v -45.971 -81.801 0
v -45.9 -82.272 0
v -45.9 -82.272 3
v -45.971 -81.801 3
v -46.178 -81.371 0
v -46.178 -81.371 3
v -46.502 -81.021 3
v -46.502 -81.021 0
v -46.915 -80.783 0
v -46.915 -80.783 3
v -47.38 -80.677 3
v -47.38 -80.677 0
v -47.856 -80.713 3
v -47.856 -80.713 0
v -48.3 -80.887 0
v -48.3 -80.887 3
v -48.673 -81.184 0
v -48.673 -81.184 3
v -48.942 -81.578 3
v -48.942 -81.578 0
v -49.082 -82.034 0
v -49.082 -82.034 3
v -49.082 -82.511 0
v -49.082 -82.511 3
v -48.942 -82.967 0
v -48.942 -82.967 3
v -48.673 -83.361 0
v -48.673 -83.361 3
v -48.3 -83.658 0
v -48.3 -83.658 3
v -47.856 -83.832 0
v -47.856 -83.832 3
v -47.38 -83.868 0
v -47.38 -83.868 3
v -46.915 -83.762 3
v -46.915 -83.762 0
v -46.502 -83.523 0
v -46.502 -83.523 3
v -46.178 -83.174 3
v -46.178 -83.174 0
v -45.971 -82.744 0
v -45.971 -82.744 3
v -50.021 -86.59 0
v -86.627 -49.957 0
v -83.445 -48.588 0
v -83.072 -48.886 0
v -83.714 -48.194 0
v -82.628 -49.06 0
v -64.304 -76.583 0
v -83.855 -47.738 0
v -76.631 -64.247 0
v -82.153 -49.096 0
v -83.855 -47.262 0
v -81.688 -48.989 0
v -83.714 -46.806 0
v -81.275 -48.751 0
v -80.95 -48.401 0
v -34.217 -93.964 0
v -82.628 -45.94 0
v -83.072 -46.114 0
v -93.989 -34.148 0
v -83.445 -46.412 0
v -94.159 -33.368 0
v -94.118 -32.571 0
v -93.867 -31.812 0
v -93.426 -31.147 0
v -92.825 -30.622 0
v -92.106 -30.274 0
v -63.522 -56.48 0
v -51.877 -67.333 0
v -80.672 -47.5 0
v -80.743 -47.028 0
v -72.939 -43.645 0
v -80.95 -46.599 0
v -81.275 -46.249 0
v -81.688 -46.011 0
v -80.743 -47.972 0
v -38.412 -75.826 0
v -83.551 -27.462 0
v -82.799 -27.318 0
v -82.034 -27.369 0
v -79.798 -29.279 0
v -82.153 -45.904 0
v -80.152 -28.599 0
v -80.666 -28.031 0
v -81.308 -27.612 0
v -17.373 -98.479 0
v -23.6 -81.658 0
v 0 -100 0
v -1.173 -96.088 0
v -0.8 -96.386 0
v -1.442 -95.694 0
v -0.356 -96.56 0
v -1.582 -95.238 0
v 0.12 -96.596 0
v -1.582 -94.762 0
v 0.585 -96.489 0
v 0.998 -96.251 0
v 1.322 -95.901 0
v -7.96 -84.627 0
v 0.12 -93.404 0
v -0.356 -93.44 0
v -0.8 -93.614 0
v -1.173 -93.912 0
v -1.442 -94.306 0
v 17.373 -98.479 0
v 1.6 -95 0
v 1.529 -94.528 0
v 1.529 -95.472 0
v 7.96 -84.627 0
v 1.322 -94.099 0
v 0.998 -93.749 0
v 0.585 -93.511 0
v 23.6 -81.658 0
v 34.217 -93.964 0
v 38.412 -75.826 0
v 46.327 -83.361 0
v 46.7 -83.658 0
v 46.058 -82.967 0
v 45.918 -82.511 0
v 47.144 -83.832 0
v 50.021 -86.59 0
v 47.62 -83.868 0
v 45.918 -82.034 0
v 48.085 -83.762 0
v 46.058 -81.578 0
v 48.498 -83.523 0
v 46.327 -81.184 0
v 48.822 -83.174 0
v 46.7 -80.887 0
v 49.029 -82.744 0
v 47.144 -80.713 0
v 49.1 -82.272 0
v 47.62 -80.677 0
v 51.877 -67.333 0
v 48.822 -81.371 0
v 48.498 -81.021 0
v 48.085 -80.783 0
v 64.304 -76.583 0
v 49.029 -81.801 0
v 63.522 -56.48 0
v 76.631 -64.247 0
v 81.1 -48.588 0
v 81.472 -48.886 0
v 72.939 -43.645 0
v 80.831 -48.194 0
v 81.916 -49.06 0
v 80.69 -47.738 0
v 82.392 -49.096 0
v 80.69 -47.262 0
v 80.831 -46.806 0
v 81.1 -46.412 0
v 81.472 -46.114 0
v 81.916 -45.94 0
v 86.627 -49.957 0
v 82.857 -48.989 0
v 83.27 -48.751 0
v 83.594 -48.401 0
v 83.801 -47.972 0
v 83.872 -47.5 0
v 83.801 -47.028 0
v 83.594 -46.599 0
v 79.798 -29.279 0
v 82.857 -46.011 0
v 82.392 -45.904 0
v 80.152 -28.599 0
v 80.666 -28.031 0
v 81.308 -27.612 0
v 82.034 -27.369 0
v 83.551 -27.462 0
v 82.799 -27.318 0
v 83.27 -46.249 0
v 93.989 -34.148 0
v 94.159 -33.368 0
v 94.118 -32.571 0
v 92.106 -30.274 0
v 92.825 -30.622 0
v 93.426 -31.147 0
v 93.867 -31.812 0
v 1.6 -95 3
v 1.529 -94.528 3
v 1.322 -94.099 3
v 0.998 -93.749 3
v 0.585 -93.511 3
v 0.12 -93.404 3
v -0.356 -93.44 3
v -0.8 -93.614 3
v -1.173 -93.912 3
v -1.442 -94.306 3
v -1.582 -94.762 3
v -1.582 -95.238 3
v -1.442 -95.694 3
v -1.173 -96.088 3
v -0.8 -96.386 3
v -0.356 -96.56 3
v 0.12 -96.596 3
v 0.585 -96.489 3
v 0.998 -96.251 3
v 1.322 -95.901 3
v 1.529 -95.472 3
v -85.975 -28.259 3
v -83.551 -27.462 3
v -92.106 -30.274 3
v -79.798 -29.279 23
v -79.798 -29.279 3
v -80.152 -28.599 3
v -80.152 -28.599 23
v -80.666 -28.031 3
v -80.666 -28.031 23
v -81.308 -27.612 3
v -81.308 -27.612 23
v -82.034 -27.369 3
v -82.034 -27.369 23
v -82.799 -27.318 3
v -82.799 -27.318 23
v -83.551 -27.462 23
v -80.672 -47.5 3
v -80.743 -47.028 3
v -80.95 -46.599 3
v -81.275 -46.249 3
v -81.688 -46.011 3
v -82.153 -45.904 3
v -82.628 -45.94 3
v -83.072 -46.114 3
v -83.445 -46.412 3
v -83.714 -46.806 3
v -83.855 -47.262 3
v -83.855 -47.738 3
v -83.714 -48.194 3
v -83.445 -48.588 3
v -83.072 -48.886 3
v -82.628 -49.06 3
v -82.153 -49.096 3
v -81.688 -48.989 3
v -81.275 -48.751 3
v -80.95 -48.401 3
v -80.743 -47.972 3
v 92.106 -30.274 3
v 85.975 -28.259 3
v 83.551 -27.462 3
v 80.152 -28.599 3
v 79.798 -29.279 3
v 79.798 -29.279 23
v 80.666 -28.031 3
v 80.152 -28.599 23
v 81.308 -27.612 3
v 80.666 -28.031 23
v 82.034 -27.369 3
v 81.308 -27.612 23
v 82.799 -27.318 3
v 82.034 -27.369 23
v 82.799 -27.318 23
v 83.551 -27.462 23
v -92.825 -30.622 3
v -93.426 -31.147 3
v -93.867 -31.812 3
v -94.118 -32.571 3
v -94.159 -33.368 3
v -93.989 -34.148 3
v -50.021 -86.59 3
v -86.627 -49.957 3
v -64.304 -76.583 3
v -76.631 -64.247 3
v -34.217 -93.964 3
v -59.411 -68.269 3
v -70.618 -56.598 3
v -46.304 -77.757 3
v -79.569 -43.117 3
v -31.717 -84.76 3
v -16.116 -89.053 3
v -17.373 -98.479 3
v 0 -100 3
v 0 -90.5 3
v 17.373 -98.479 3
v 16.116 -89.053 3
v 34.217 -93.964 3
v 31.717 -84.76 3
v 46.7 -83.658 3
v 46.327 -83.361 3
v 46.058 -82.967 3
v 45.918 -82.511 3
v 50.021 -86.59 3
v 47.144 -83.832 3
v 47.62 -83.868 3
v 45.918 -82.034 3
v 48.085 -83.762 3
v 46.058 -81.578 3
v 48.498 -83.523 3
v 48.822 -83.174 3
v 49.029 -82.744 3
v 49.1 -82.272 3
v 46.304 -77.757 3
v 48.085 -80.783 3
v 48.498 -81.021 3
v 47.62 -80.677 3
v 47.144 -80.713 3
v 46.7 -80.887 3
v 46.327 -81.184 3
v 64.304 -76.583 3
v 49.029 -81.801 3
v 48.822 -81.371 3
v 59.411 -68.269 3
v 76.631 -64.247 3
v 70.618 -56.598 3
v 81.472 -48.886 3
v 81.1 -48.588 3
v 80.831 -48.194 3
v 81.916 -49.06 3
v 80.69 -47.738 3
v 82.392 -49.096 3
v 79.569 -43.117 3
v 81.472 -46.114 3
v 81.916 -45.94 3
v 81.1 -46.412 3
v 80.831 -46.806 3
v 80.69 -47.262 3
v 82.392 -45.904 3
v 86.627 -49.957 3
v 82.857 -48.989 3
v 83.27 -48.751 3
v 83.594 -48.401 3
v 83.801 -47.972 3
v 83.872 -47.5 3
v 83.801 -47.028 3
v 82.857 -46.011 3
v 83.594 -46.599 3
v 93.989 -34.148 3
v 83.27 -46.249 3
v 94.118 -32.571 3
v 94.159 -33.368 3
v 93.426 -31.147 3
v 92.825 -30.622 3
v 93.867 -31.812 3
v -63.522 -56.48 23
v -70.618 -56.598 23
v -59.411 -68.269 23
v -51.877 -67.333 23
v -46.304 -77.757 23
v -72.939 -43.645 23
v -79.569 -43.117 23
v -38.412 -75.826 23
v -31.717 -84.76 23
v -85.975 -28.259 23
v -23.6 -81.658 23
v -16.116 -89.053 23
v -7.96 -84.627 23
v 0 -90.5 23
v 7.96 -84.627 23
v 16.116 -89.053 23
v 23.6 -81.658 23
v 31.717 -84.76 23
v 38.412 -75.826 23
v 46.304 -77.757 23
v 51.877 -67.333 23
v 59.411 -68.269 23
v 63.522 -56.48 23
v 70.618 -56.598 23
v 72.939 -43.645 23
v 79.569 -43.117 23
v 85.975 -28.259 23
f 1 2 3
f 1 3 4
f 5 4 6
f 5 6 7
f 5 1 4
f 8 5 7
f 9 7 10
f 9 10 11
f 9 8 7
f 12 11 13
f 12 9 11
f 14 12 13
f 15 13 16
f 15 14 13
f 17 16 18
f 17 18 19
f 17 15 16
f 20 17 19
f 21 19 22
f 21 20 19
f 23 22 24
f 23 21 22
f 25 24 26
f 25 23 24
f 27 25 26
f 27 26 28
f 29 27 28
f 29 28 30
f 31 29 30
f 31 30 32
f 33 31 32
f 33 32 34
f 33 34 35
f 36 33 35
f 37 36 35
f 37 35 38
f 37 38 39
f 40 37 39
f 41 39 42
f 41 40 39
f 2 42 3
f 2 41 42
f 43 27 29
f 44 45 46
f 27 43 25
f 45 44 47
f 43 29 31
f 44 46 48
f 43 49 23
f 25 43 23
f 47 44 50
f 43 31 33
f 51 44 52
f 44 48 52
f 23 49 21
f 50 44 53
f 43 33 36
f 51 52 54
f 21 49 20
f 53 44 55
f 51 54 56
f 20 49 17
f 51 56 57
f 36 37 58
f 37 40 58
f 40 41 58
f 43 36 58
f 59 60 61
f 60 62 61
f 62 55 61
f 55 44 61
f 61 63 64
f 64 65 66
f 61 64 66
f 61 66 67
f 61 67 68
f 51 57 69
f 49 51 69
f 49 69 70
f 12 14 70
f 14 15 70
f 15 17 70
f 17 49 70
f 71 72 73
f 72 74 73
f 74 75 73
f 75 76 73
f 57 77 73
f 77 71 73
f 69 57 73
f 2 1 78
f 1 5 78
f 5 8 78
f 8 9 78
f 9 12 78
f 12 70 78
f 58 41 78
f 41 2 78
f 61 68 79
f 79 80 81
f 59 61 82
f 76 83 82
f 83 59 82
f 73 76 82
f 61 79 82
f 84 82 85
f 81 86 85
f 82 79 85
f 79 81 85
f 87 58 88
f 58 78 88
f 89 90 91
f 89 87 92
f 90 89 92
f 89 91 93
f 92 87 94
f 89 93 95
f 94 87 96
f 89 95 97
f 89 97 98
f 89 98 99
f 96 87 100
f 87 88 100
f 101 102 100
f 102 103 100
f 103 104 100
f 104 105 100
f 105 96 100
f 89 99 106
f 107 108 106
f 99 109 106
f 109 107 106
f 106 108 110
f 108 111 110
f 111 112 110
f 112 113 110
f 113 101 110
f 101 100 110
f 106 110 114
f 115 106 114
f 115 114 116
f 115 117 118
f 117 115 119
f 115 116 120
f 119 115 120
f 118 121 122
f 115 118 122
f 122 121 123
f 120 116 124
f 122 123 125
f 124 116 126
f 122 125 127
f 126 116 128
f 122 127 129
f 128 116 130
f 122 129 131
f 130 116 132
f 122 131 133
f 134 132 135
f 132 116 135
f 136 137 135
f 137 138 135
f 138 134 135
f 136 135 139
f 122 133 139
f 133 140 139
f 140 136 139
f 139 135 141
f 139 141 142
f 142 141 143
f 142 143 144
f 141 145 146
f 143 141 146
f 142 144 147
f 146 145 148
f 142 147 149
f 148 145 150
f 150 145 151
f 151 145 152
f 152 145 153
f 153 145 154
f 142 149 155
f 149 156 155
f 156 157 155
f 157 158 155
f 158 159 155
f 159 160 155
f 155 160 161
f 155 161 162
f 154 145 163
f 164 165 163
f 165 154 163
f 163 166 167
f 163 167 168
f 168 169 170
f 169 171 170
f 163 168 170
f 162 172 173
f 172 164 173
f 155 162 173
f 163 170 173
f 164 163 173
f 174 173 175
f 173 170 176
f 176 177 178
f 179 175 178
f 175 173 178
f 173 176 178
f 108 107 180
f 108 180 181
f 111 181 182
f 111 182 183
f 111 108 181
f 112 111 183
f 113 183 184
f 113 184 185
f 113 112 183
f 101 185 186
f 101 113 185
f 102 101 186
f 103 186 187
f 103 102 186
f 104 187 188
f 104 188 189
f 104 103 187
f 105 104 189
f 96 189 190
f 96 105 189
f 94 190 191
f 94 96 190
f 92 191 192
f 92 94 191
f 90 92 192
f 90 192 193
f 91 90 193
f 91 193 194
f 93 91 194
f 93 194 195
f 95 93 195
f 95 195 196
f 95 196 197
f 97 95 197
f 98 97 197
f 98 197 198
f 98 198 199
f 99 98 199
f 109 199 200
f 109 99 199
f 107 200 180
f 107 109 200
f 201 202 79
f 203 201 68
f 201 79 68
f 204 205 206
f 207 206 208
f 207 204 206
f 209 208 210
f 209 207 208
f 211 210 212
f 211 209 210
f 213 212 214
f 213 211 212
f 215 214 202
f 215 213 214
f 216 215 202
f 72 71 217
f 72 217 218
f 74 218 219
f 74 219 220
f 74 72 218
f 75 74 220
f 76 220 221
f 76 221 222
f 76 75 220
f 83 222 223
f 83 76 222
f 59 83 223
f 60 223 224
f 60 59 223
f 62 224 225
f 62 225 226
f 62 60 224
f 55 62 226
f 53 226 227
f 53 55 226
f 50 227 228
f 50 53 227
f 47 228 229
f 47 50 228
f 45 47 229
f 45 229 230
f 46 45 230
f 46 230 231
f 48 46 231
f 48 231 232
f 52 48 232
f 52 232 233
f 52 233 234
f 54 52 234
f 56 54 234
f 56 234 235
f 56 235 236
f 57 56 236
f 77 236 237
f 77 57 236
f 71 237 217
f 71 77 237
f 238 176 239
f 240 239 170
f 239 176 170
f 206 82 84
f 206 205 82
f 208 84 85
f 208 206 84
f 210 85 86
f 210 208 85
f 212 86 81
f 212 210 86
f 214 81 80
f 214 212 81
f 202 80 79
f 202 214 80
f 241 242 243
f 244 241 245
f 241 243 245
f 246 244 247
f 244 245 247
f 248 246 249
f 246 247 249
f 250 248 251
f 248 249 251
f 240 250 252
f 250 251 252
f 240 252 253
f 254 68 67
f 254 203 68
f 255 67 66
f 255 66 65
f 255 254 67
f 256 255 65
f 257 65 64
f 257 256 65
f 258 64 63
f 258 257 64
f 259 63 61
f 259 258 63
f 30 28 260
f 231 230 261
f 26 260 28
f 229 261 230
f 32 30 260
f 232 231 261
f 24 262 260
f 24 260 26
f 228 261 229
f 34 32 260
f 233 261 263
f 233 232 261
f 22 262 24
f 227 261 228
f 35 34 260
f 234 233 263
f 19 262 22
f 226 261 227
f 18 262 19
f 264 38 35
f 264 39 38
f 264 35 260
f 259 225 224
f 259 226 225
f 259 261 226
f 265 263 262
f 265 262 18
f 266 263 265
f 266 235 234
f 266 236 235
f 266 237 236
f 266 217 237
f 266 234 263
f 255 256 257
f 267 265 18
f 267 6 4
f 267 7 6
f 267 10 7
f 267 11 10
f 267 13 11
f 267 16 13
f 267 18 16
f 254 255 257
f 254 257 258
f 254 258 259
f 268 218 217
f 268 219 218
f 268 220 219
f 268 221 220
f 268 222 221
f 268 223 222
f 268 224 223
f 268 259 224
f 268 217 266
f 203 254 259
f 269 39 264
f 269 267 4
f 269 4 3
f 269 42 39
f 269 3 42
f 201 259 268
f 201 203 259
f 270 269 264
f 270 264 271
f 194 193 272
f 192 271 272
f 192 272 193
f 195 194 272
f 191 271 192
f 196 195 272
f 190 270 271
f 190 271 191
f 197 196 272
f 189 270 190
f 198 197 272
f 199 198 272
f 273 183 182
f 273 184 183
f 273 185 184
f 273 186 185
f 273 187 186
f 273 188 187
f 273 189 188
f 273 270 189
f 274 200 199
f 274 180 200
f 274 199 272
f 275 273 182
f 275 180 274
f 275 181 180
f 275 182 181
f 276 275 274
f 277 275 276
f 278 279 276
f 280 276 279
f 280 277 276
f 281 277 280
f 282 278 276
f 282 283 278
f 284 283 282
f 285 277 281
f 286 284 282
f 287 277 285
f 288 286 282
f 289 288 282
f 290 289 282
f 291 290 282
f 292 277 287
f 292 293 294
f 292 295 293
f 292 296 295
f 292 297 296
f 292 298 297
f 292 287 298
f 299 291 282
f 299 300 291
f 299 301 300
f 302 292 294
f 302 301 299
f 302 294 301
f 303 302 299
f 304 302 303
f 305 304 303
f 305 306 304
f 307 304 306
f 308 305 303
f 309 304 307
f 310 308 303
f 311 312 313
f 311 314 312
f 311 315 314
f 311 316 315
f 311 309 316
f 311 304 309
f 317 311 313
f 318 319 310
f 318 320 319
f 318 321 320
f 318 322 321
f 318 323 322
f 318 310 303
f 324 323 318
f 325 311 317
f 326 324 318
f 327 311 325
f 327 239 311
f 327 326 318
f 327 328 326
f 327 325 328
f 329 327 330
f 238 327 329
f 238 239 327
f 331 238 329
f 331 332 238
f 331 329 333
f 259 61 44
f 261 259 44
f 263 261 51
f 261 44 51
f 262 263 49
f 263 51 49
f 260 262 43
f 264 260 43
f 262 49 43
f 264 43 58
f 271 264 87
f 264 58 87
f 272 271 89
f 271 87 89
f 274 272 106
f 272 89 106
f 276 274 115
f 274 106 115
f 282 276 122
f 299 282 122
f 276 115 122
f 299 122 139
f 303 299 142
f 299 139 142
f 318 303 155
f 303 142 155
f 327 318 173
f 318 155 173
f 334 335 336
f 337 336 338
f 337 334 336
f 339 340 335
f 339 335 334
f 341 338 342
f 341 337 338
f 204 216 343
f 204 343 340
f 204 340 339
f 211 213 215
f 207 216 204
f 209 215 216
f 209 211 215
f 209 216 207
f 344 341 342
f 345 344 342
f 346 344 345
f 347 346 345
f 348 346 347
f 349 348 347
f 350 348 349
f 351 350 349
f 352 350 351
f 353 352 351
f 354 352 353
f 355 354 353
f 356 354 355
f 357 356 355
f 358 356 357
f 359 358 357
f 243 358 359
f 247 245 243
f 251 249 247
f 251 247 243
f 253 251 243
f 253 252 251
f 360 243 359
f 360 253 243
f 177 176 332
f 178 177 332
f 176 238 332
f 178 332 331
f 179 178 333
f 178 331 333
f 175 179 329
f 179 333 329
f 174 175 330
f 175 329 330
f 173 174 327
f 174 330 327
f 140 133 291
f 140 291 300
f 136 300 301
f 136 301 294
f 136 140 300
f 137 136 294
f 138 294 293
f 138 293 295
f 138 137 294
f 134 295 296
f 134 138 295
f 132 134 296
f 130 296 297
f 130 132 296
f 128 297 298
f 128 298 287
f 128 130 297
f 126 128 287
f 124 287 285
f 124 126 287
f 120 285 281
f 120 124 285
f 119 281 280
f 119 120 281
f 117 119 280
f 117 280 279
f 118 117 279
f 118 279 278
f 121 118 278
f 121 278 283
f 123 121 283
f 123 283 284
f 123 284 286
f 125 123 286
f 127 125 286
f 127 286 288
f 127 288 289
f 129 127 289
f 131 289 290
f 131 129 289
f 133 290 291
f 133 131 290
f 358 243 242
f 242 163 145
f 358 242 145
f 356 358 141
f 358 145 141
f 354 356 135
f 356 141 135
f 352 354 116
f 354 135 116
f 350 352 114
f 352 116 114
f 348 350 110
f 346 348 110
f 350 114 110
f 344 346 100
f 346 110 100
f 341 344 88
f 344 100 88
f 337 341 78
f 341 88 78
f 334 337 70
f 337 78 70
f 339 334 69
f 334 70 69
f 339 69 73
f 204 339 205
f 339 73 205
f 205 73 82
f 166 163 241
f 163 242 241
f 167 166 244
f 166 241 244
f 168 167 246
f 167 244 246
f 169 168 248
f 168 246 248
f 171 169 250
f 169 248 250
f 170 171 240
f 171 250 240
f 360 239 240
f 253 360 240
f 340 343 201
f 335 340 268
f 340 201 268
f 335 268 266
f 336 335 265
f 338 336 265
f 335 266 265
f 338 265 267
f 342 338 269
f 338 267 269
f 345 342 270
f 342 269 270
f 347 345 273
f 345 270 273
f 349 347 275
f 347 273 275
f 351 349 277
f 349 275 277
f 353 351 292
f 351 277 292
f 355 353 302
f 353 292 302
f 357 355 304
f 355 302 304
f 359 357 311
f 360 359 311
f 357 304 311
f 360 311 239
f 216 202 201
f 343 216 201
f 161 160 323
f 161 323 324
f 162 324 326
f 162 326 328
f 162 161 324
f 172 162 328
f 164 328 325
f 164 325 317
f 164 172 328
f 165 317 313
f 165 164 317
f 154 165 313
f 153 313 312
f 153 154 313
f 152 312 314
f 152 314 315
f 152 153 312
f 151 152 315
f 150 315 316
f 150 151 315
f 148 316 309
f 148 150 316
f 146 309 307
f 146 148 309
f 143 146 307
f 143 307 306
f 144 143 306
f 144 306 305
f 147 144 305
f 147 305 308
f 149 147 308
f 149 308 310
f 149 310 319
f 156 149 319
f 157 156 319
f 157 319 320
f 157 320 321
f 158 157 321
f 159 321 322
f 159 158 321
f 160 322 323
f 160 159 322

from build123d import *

# Parameters (mm, degrees)
SKETCH_1_R      = 1.6
EXTRUDE_1_DEPTH = 3
EXTRUDE_2_DEPTH = 20
FILLET_1_R      = 3


with BuildPart() as part:
    # 草图1 → 凸台-拉伸1 (new body)
    with BuildSketch(Plane.XY):
        with BuildLine():
            ThreePointArc((80.75, -26.541241493), (0, -85), (-80.75, -26.541241493))
            Line((-80.75, -26.541241493), (-95, -31.224989992))
            ThreePointArc((-95, -31.224989992), (0, -100), (95, -31.224989992))
            Line((95, -31.224989992), (80.75, -26.541241493))
        make_face()
        with Locations((-47.5, -82.27241336)):
            Circle(SKETCH_1_R, mode=Mode.SUBTRACT)
        with Locations((-82.27241336, -47.5)):
            Circle(SKETCH_1_R, mode=Mode.SUBTRACT)
        with Locations((0, -95)):
            Circle(SKETCH_1_R, mode=Mode.SUBTRACT)
        with Locations((47.5, -82.27241336)):
            Circle(SKETCH_1_R, mode=Mode.SUBTRACT)
        with Locations((82.27241336, -47.5)):
            Circle(SKETCH_1_R, mode=Mode.SUBTRACT)
    extrude(amount=EXTRUDE_1_DEPTH)

    # 草图2 → 凸台-拉伸2 (add)
    with BuildSketch(Plane.XY.offset(3)):
        with BuildLine():
            ThreePointArc((80.75, -26.541241493), (0, -85), (-80.75, -26.541241493))
            Line((-80.75, -26.541241493), (-85.975, -28.258615943))
            ThreePointArc((-85.975, -28.258615943), (0, -90.5), (85.975, -28.258615943))
            Line((85.975, -28.258615943), (80.75, -26.541241493))
        make_face()
    extrude(amount=EXTRUDE_2_DEPTH)

    # 圆角1
    fillet_1_edges = [part.edges().sort_by_distance(p)[0] for p in [
        (80.75, -26.541241493, 11.5),
        (95, -31.224989992, 1.5),
        (-95, -31.224989992, 1.5),
        (-80.75, -26.541241493, 11.5),
    ]]
    fillet(fillet_1_edges, radius=FILLET_1_R)


solid = part.part
